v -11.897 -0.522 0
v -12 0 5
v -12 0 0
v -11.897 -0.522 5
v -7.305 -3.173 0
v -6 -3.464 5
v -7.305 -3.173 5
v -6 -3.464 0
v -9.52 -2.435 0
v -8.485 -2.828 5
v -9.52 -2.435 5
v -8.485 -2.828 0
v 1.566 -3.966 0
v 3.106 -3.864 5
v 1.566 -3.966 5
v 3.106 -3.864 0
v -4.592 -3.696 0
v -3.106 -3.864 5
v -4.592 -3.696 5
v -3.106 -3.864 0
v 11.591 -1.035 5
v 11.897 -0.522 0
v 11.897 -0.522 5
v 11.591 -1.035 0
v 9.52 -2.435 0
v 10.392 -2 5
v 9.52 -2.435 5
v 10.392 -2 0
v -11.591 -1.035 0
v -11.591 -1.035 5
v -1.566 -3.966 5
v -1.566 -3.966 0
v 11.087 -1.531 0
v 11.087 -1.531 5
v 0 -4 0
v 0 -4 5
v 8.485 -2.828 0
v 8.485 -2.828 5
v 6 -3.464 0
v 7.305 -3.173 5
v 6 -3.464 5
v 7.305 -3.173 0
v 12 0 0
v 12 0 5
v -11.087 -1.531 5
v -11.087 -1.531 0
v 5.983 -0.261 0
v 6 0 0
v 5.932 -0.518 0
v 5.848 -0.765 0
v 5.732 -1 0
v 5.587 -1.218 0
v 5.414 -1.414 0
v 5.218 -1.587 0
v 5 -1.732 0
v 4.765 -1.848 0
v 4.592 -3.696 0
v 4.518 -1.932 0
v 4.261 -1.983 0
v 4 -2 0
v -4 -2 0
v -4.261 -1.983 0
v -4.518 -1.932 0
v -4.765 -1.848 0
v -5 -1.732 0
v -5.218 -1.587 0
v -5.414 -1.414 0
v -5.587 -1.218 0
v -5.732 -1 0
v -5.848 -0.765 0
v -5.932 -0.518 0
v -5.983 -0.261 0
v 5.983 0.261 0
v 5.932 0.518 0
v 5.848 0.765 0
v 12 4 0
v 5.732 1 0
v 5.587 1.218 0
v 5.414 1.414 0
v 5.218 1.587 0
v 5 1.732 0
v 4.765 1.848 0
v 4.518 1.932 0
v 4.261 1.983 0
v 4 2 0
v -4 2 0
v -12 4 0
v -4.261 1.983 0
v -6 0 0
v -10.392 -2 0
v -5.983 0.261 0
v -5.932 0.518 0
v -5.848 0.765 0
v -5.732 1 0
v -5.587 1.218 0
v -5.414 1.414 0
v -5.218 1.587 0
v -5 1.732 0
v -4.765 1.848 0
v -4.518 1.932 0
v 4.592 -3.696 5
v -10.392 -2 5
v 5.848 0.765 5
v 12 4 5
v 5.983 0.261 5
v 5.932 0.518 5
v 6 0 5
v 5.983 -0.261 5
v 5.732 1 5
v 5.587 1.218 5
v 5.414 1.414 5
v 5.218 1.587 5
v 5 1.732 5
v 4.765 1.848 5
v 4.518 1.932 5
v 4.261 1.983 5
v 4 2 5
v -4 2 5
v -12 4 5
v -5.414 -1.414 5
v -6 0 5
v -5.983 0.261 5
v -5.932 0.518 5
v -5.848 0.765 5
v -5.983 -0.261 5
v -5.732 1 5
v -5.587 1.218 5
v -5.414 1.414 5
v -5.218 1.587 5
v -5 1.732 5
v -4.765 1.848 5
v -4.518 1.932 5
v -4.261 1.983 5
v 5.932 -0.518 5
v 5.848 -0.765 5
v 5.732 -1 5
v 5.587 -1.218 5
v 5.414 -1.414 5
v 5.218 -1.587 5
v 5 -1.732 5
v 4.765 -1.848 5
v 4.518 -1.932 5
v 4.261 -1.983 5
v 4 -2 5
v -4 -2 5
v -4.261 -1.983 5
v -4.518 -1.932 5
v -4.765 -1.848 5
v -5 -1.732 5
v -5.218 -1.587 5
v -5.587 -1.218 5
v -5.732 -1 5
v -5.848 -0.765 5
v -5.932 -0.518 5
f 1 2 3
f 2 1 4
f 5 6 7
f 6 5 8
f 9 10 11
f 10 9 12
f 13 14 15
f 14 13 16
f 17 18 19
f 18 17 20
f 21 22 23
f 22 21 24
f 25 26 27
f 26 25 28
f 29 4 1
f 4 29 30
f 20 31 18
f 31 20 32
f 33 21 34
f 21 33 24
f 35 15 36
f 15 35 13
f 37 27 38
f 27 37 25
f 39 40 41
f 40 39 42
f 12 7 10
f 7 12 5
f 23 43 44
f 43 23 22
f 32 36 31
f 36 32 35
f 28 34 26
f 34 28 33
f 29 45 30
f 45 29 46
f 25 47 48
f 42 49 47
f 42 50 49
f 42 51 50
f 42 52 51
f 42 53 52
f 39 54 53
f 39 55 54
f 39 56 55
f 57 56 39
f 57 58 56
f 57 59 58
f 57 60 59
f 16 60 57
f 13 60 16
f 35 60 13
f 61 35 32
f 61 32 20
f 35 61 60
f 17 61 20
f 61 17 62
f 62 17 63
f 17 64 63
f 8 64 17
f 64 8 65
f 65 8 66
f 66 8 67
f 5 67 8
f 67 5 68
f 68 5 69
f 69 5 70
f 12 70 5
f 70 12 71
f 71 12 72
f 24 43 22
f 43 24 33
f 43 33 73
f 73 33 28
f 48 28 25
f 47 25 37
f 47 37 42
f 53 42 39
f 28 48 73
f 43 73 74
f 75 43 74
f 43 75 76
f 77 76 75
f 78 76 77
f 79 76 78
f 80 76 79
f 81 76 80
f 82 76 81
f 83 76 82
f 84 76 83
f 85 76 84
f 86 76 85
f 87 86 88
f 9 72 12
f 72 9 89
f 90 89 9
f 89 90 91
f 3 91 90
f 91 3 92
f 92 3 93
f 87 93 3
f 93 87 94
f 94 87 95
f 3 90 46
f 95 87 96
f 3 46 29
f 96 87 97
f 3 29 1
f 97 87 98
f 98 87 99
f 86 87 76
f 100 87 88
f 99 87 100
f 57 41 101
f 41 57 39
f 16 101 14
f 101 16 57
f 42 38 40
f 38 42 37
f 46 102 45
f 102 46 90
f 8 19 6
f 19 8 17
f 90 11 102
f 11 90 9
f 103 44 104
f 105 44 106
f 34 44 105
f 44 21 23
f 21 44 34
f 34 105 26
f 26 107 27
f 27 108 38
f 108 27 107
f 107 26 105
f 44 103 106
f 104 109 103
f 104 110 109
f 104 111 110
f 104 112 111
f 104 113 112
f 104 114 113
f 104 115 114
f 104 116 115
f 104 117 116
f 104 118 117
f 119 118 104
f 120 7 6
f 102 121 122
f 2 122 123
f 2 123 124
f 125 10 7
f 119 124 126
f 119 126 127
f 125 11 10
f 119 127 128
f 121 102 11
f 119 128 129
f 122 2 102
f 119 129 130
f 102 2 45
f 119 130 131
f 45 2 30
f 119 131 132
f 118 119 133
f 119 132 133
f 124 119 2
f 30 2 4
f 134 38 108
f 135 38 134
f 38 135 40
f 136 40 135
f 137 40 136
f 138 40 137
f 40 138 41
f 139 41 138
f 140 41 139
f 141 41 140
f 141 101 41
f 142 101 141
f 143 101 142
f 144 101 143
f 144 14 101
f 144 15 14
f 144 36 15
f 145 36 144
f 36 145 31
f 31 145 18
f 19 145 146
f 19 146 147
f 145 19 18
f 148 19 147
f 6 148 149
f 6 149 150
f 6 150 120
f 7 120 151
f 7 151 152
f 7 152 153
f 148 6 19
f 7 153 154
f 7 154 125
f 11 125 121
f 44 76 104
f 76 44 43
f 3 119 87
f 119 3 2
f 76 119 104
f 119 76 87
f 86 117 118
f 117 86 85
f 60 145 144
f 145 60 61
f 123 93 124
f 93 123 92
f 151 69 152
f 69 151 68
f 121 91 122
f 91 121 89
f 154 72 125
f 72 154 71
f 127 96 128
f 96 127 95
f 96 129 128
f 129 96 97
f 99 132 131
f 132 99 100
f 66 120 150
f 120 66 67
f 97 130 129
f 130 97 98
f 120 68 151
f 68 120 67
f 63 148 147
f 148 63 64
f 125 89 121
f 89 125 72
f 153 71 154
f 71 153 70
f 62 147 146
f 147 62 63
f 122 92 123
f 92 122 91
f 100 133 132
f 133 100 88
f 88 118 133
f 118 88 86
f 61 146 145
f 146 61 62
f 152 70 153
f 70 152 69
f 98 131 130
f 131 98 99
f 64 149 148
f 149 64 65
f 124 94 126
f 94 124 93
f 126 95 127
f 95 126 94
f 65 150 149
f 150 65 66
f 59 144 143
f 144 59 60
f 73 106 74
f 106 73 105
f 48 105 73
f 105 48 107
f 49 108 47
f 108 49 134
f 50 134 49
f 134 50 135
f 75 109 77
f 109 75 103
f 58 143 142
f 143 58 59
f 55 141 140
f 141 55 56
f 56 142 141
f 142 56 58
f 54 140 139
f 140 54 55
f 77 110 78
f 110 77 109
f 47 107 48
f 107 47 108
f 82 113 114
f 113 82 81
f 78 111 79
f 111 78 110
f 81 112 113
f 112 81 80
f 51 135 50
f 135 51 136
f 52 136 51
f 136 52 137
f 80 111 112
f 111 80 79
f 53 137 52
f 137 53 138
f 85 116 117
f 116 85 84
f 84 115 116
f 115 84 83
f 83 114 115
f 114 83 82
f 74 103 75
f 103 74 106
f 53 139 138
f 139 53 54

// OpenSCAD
epsilon=0.01;
ring_r=4;
ring_t=1.5;
ring_h=5;
letter_size=4;

$fn=48;

module case () {
  // import("s4_case_template.stl");
  import("stl_fixed_s4_case_template/fixed.stl");
}

module eyelet () {
  difference() {
    scale([3,1,1]) {
      union() {
        cylinder(r=ring_r, h=ring_h);
        translate([-ring_r,0,0]) {
          cube([ring_r*2, ring_r, ring_h]);
        }
      }
    }
    translate([0,0,-epsilon]) {
      scale([1,1,1+epsilon]) {
        union() {
          translate([-ring_r,-ring_r/2,0]) {
            cube([ring_r*2, ring_r, ring_h]);
          }
          translate([-ring_r,0,0]) {
            cylinder(r=ring_r/2, h=ring_h+2*epsilon);
          }
          translate([ring_r,0,0]) {
            cylinder(r=ring_r/2, h=ring_h+2*epsilon);
          }

        }
      }
    }
          
                 

    /* translate([0,0,-epsilon]) */
    /*   cylinder(r=ring_r-ring_t, h=ring_h+2*epsilon); */
    
  }
}

module monogram () {
  linear_extrude(height=5) {
    text("A", font="Comic Sans MS");
  }
}

module unit () {
  difference () {
    case();
    translate([-20,-5,-1]) {
      scale([letter_size, letter_size, letter_size]) {
        rotate([0,0,-90]) {
          mirror() {
            monogram();
          }
        }
      }
    }
  }
}

union() {
//  case();
  //monogram();
  eyelet();
}
